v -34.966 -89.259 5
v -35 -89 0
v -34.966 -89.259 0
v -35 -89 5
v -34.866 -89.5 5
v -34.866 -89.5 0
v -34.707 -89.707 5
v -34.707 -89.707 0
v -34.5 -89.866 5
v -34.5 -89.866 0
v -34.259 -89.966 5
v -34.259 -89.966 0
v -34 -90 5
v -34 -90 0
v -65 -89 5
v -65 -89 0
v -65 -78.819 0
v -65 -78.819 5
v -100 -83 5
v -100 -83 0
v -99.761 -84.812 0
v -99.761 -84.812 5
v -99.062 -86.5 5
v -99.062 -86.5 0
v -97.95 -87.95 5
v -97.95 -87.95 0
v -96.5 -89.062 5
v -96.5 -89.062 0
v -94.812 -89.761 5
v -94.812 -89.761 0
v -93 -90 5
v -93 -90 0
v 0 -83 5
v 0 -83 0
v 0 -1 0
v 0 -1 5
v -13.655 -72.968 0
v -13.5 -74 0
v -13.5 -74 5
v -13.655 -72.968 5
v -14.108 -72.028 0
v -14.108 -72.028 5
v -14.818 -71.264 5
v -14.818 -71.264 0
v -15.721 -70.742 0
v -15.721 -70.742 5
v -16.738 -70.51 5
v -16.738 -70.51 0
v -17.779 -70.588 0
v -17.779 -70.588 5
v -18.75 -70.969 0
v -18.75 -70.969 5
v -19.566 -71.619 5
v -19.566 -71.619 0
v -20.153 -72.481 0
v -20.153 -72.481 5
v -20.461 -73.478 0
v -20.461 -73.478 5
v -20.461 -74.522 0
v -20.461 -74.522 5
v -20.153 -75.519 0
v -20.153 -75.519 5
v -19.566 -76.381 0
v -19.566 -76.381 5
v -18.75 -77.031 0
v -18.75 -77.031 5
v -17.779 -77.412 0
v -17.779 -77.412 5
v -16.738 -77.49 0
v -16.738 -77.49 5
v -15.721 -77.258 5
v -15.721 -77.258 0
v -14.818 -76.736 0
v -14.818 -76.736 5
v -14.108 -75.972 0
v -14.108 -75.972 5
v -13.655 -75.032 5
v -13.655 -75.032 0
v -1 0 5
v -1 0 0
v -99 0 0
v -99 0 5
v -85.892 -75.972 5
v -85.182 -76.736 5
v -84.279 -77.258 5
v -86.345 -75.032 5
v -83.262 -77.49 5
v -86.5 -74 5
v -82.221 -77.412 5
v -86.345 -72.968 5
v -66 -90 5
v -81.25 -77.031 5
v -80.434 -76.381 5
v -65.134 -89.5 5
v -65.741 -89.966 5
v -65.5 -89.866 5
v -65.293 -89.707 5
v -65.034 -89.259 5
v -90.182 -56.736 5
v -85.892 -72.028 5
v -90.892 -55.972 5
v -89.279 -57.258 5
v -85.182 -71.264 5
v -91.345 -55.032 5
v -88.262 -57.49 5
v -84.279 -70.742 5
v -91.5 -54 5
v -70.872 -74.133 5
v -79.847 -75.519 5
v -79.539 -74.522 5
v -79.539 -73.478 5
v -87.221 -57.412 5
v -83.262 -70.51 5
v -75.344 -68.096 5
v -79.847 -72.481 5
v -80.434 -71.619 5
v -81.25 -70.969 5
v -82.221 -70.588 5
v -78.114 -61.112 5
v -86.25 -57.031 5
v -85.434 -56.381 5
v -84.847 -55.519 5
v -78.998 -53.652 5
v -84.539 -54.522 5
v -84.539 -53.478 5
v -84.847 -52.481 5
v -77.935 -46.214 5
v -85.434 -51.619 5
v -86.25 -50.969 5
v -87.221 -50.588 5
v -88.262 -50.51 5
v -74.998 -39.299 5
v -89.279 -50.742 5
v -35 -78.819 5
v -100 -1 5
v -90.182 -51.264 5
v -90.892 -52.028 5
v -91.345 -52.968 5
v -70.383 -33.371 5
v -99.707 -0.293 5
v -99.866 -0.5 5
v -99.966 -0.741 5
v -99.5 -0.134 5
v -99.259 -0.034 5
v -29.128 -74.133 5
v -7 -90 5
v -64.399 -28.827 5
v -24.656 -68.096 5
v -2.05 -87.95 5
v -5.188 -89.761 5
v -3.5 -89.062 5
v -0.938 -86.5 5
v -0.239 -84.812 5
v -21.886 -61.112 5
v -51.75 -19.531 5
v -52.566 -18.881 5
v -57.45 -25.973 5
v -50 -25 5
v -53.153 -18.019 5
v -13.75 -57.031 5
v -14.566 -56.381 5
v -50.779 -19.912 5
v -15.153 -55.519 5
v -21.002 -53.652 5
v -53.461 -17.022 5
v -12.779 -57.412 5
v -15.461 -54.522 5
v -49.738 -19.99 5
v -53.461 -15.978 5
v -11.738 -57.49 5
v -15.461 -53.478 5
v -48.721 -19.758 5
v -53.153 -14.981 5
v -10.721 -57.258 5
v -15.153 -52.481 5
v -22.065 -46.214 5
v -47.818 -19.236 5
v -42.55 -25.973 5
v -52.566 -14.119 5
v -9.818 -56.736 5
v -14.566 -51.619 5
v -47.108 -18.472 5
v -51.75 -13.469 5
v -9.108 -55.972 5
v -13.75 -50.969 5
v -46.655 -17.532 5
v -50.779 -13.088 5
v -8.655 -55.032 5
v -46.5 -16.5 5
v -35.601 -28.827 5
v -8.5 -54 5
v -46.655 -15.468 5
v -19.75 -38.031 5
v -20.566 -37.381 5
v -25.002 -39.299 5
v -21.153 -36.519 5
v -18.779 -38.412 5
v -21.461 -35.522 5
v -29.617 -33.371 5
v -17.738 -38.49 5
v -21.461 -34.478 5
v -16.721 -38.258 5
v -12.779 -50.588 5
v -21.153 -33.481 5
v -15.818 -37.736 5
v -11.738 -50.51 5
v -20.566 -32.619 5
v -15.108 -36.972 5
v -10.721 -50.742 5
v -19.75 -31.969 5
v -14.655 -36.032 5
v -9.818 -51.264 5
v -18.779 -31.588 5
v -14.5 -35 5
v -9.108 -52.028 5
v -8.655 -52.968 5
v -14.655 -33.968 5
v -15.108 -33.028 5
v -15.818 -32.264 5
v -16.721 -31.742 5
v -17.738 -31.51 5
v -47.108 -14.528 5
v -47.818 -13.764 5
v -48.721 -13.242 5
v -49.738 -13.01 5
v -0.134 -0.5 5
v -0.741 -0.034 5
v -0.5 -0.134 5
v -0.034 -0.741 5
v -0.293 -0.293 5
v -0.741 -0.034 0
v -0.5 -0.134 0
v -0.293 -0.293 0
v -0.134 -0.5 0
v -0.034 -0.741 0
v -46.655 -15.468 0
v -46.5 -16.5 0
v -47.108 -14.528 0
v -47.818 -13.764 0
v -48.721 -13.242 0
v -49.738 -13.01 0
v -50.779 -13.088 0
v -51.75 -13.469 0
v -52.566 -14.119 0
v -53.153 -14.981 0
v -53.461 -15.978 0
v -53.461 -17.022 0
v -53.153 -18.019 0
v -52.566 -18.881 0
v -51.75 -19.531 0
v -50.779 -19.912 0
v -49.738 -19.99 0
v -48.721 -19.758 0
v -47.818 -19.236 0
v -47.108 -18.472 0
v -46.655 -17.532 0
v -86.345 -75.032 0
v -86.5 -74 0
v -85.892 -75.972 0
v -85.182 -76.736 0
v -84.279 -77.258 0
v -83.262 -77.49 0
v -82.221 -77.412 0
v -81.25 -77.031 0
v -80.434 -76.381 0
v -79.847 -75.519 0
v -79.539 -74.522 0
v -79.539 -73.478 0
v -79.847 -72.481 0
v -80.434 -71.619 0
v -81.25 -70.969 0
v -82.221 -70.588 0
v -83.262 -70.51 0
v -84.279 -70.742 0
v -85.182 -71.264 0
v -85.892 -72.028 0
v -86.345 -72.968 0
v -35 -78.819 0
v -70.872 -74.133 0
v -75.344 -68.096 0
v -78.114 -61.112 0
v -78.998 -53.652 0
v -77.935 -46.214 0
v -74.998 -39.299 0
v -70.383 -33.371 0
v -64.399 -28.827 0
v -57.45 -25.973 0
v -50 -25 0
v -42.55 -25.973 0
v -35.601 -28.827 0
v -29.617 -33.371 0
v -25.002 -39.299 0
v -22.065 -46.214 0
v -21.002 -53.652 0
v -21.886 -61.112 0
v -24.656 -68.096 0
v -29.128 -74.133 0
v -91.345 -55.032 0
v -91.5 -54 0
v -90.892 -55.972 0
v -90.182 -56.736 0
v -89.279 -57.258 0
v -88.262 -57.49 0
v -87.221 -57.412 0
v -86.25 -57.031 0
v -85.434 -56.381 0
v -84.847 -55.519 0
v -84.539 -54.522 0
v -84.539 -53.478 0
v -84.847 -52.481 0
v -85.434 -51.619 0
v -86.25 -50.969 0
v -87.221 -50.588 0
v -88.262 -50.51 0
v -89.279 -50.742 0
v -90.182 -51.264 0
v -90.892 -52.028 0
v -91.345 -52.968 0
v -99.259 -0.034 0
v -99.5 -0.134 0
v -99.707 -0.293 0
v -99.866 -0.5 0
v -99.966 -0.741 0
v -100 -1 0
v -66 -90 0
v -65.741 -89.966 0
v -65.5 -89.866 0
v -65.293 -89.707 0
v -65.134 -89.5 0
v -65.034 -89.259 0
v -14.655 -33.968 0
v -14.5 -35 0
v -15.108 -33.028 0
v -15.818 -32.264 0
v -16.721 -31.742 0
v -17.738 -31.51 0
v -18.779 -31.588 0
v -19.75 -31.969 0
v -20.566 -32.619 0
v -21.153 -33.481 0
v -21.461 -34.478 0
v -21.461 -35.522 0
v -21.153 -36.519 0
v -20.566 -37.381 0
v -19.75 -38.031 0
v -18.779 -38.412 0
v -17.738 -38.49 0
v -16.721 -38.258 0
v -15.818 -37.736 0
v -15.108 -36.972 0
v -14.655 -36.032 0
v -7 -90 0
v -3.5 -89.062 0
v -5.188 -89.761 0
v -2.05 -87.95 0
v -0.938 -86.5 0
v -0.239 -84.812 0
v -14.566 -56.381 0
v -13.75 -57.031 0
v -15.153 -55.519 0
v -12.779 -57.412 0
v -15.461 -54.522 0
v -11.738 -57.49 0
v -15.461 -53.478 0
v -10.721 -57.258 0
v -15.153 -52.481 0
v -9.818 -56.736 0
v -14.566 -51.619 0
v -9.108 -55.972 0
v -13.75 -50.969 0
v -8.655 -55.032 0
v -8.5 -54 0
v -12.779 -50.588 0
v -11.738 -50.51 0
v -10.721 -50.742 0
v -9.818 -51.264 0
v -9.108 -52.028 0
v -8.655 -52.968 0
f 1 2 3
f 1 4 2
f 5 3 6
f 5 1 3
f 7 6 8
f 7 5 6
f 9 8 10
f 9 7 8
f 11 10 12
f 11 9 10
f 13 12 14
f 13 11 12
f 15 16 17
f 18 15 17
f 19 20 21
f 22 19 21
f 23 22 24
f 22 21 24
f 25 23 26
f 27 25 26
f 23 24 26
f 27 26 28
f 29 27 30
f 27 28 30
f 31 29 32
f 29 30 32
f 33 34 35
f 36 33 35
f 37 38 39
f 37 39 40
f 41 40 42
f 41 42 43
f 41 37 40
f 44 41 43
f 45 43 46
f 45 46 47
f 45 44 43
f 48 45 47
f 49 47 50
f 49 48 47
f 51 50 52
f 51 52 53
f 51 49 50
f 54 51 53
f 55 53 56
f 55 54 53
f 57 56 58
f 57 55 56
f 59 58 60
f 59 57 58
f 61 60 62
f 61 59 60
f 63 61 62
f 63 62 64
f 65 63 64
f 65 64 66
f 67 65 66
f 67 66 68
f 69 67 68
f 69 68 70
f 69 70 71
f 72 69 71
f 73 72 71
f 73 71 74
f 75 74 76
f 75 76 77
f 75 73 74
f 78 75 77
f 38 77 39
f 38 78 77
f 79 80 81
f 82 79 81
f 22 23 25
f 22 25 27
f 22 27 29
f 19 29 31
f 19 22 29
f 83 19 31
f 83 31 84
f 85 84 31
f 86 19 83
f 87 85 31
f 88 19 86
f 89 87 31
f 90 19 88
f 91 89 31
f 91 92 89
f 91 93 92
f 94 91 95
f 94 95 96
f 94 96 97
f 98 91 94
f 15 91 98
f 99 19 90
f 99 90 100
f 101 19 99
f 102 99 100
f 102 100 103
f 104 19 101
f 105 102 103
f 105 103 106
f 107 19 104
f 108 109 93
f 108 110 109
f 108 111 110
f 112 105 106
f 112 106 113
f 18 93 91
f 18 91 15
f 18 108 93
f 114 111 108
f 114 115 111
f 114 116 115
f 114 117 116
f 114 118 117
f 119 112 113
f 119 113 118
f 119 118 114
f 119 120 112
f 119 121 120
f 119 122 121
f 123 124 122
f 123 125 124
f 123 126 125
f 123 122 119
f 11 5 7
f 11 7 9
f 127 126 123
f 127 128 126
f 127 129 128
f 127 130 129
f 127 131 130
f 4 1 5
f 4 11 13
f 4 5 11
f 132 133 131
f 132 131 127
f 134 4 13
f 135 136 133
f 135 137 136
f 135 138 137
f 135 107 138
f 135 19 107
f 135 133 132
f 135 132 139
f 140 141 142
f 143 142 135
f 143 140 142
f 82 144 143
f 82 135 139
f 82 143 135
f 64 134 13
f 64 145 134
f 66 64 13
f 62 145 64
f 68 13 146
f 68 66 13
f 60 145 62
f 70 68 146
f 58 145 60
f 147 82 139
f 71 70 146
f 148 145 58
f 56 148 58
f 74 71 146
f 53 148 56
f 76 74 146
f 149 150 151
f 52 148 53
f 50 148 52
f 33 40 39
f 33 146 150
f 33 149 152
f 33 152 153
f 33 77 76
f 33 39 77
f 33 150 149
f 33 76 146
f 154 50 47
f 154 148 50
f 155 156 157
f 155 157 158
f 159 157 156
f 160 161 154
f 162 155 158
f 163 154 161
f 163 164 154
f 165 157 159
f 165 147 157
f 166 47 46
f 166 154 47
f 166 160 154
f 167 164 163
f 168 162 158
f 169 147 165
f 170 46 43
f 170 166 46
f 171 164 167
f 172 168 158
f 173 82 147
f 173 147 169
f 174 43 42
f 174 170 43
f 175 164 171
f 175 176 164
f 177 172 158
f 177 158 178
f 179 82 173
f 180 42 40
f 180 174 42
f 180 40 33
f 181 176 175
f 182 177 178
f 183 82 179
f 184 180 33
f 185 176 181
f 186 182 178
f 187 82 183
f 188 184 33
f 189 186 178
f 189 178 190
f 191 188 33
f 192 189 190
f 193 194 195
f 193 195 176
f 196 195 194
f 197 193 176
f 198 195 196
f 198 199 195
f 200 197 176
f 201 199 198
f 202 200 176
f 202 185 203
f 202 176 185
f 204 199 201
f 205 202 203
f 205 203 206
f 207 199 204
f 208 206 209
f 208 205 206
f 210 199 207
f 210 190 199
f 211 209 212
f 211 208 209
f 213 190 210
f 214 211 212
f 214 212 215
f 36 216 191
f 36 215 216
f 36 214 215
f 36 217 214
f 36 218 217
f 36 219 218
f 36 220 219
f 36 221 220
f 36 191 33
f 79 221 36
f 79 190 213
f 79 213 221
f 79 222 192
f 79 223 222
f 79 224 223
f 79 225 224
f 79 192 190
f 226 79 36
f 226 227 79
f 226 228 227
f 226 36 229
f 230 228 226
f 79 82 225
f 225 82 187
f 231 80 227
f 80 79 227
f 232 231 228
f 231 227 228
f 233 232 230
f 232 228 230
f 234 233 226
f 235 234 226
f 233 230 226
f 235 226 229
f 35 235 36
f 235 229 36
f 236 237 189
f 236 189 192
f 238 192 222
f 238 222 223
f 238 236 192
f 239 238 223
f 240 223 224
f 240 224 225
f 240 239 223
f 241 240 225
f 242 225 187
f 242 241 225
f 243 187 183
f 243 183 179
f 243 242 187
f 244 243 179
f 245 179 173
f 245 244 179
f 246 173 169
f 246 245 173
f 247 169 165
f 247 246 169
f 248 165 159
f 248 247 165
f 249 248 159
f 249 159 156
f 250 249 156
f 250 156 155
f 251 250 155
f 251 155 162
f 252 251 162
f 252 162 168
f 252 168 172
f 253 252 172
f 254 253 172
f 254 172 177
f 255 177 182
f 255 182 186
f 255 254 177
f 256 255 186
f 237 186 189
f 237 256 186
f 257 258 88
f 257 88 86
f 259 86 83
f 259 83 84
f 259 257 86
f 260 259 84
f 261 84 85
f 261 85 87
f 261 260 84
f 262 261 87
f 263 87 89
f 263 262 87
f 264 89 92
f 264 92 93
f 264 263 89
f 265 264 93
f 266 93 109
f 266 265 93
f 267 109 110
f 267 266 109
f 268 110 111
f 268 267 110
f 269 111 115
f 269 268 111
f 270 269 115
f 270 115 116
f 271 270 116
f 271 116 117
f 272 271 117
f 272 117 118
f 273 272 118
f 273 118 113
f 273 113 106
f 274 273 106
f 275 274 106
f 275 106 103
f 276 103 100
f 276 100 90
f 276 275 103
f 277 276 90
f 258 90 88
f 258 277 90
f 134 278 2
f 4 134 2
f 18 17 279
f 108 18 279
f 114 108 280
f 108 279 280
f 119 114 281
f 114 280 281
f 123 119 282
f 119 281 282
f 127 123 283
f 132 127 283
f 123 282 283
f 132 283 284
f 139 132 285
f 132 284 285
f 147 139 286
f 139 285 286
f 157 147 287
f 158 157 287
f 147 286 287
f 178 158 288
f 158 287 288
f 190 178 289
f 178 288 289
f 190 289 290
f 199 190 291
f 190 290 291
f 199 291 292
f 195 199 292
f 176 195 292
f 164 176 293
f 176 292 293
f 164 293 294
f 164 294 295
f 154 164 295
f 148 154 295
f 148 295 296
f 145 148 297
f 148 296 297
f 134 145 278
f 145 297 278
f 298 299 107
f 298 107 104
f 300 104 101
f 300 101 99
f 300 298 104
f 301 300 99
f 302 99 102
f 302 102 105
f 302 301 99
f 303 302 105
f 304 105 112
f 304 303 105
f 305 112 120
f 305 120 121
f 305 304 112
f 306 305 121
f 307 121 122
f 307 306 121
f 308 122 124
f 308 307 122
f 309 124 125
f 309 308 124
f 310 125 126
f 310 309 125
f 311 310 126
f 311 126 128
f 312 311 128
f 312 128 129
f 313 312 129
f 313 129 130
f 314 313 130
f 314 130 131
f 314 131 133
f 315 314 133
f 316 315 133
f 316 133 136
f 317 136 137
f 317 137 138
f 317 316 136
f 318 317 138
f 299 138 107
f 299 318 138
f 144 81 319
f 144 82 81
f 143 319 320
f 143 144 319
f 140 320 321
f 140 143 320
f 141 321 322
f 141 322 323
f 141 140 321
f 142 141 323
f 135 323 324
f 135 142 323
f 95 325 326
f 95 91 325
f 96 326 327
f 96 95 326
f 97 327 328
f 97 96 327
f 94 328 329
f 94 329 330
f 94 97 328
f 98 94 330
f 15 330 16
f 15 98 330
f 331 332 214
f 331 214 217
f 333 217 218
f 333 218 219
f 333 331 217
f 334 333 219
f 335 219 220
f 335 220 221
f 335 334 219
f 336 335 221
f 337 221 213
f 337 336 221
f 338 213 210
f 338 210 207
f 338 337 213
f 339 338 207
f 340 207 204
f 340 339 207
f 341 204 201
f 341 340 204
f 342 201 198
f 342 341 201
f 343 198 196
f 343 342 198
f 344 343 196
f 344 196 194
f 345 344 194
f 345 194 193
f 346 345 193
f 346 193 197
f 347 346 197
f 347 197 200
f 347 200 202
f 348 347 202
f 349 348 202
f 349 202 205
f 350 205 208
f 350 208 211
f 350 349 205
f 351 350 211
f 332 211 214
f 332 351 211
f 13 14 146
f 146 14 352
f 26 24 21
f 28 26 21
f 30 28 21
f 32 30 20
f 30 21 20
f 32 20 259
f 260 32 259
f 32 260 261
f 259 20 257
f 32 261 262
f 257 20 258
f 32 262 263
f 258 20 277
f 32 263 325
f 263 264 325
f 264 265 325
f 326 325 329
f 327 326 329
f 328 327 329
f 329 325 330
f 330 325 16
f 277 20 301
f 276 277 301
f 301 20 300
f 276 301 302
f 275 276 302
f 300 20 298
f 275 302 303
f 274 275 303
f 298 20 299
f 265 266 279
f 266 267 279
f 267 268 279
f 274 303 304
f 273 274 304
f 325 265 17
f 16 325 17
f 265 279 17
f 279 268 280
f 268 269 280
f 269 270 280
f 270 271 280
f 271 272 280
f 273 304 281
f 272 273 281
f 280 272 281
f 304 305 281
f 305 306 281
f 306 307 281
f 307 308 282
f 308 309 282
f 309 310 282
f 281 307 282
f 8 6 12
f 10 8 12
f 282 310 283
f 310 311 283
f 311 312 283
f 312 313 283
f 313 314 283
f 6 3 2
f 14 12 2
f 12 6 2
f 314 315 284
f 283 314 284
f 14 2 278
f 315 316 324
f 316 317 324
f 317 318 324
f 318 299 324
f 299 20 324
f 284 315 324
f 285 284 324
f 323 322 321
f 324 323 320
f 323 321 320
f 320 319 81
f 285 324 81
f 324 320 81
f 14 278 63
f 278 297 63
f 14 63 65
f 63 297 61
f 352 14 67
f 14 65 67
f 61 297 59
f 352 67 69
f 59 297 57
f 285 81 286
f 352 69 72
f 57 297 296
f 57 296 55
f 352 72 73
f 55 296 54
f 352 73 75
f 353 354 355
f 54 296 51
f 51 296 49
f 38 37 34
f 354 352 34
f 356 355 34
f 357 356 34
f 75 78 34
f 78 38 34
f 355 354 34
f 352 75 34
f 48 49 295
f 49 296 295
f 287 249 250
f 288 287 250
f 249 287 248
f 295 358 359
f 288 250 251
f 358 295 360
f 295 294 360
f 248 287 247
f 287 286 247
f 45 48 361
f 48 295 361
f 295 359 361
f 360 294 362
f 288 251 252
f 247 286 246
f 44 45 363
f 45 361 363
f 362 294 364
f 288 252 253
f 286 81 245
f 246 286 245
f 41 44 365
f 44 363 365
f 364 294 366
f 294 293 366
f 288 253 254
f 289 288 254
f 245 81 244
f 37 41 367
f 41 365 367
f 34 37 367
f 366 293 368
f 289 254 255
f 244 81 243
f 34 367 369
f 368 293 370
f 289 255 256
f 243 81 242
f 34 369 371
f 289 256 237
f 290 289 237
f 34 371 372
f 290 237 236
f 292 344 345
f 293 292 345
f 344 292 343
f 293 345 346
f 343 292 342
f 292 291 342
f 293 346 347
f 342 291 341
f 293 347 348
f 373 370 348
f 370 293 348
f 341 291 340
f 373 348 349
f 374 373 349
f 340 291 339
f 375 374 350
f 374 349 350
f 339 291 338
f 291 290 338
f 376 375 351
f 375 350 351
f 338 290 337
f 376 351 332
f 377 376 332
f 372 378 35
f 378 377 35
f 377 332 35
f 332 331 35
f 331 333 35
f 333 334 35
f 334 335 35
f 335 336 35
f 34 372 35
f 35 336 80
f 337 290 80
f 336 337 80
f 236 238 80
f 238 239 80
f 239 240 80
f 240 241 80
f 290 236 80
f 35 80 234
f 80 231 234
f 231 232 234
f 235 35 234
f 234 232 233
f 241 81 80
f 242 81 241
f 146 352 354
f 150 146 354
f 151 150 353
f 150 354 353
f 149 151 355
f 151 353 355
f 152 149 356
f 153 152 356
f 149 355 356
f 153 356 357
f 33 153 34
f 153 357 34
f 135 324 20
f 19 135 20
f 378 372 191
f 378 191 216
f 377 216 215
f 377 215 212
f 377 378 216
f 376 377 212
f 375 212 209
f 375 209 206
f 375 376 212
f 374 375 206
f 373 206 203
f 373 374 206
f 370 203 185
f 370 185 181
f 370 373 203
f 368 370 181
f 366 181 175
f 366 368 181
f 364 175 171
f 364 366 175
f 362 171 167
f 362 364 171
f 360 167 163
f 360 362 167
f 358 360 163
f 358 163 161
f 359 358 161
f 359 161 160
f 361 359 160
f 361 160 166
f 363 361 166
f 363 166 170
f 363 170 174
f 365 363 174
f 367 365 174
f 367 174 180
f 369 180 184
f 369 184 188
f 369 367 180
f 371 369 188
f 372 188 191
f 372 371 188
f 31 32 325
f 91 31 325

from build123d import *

# Parameters (mm, degrees)
SKETCH1_R           = 3.5
BOSS_EXTRUDE1_DEPTH = 5
FILLET1_R           = 1
FILLET2_R           = 1
FILLET3_R           = 1
FILLET4_R           = 1


with BuildPart() as part:
    # Sketch1 → Boss-Extrude1 (new body)
    with BuildSketch(Plane.XY):
        with BuildLine():
            Line((0, 0), (-100, 0))
            Line((-100, 0), (-100, -80))
            Line((-100, -80), (-100, -83))
            ThreePointArc((-100, -83), (-97.949747468, -87.949747468), (-93, -90))
            Line((-93, -90), (-92, -90))
            Line((-92, -90), (-65, -90))
            Line((-65, -90), (-65, -78.819347292))
            ThreePointArc((-65, -78.819347292), (-50, -25), (-35, -78.819347292))
            Line((-35, -78.819347292), (-35, -90))
            Line((-35, -90), (-8, -90))
            Line((-8, -90), (-7, -90))
            ThreePointArc((-7, -90), (-2.050252532, -87.949747468), (0, -83))
            Line((0, -83), (0, -80))
            Line((0, -80), (0, 0))
        make_face()
        with Locations((-50, -16.5)):
            Circle(SKETCH1_R, mode=Mode.SUBTRACT)
        with Locations((-12, -54)):
            Circle(SKETCH1_R, mode=Mode.SUBTRACT)
        with Locations((-17, -74)):
            Circle(SKETCH1_R, mode=Mode.SUBTRACT)
        with Locations((-18, -35)):
            Circle(SKETCH1_R, mode=Mode.SUBTRACT)
        with Locations(Location((-83, -74, 0), (0, 0, 180))):
            Circle(SKETCH1_R, mode=Mode.SUBTRACT)
        with Locations(Location((-88, -54, 0), (0, 0, 180))):
            Circle(SKETCH1_R, mode=Mode.SUBTRACT)
    extrude(amount=BOSS_EXTRUDE1_DEPTH)

    # Fillet1
    fillet1_edges = [part.edges().sort_by_distance(p)[0] for p in [
        (-100, 0, 2.5),
    ]]
    fillet(fillet1_edges, radius=FILLET1_R)

    # Fillet2
    fillet2_edges = [part.edges().sort_by_distance(p)[0] for p in [
        (0, 0, 2.5),
    ]]
    fillet(fillet2_edges, radius=FILLET2_R)

    # Fillet3
    fillet3_edges = [part.edges().sort_by_distance(p)[0] for p in [
        (-65, -90, 2.5),
    ]]
    fillet(fillet3_edges, radius=FILLET3_R)

    # Fillet4
    fillet4_edges = [part.edges().sort_by_distance(p)[0] for p in [
        (-35, -90, 2.5),
    ]]
    fillet(fillet4_edges, radius=FILLET4_R)


solid = part.part
